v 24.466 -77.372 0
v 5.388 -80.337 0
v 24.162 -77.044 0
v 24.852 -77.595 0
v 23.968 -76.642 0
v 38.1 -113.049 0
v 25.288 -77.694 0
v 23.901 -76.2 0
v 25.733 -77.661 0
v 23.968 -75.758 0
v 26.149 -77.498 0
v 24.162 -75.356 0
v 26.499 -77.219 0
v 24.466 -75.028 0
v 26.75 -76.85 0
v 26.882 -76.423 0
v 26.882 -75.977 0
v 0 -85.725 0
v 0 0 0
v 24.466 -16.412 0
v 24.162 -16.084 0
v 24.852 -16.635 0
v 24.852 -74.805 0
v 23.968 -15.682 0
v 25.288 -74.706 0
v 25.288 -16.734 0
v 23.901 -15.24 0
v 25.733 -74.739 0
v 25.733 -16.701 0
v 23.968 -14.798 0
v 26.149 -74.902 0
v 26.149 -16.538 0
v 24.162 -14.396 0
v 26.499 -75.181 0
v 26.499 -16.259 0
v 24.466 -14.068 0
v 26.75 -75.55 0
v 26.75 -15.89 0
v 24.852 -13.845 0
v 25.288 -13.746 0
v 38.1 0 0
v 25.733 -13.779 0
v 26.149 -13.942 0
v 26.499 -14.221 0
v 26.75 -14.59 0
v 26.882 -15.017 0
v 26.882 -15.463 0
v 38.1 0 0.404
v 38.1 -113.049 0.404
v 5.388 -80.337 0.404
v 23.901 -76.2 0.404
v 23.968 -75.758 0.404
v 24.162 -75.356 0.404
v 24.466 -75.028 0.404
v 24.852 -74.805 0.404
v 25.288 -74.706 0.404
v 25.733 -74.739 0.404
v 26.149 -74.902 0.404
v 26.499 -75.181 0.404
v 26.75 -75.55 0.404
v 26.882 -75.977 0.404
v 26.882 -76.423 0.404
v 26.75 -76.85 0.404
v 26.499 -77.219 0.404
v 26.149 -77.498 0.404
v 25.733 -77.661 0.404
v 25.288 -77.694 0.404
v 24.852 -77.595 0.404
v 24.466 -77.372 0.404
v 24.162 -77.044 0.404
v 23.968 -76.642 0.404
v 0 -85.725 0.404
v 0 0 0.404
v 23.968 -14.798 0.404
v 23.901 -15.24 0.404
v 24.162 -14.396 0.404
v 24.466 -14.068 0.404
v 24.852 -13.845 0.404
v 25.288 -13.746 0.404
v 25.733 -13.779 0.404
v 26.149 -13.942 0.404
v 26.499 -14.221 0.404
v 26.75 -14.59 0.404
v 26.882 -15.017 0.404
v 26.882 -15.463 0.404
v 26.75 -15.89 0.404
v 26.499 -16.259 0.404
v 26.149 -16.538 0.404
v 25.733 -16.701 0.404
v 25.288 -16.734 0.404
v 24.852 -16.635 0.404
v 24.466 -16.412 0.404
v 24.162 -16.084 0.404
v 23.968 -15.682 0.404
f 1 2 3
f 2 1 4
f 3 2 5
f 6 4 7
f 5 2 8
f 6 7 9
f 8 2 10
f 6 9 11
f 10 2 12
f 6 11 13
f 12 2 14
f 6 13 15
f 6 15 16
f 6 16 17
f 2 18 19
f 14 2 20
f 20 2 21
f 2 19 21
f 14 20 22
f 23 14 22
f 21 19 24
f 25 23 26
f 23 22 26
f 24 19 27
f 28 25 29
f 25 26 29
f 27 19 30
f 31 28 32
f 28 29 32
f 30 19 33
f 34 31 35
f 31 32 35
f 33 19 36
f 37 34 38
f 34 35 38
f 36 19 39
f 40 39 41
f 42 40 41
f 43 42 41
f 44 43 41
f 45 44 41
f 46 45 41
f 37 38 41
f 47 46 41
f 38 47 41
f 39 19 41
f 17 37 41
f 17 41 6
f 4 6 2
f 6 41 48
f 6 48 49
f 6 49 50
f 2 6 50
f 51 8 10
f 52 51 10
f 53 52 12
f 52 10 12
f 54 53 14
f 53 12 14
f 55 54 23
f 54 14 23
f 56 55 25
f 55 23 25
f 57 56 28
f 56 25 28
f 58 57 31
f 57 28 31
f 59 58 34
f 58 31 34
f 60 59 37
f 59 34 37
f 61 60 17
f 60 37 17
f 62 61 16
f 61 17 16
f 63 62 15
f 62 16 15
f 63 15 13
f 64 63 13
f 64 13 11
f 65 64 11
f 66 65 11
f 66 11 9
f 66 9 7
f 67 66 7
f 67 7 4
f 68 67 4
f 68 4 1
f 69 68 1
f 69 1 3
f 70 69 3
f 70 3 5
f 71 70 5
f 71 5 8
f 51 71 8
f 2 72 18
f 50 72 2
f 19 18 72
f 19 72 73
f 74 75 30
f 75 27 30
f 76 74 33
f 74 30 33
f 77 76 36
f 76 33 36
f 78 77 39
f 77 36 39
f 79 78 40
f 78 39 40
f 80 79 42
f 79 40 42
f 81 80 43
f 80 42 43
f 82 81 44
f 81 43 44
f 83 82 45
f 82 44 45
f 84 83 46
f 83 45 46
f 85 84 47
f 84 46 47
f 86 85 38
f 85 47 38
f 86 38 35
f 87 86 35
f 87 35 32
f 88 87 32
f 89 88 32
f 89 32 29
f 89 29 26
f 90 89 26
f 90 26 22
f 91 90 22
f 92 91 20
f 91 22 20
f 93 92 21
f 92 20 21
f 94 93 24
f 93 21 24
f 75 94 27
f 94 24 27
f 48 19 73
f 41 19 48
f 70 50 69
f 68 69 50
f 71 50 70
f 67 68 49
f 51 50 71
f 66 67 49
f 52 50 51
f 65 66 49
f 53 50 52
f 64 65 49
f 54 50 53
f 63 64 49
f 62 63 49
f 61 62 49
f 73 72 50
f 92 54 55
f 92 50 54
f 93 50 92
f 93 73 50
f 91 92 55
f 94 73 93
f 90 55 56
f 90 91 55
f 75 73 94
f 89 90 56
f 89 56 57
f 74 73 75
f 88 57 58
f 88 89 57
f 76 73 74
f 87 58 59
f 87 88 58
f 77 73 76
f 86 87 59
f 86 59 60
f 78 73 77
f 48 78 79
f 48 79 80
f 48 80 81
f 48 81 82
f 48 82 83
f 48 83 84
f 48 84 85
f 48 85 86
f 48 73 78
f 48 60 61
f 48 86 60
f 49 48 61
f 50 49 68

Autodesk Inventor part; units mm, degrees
ref_plane "YZ Plane" through (0, 0, 0) normal (1, 0, 0) x (0, 1, 0)
ref_plane "XZ Plane" through (0, 0, 0) normal (0, 1, 0) x (-1, 0, 0)
ref_plane "XY Plane" through (0, 0, 0) normal (0, 0, 1) x (1, 0, 0)
sketch "Sketch1" plane through (0, 0, 0) normal (0, 0, 1) x (1, 0, 0)
  line L0 (0, 0) -> (38.1, 0)
  line L1 (38.1, 0) -> (38.1, -85.725)
  line L2 (38.1, -85.725) -> (0, -85.725)
  line L3 (0, -85.725) -> (0, 0)
  line L4 (38.1, -85.725) -> (38.1, -123.825)
  line L5 (38.1, -123.825) -> (0, -85.725)
  dimension "d0" = 38.1
  dimension "d1" = 85.725
  dimension "d4" = 38.1
extrude "Extrusion1" add sketch "Sketch1" along normal blind 0.4039 contours L0 L1 L2 L3
extrude "Extrusion2" add sketch "Sketch1" along normal blind 0.4039 contours L2 L4 L5
sketch "Sketch2" plane through (0, 0, 0.4039) normal (0, 0, 1) x (1, 0, 0)
  line L0 (0, -85.725) -> (38.1, -123.825) projected
  line L1 (38.1, -123.825) -> (38.1, 0) projected
  line L2 (38.1, -113.0487) -> (5.3882, -80.3368)
  line L3 (0, -85.725) -> (5.3882, -80.3368)
  line L4 (38.1, -113.0487) -> (38.1, -123.825)
  line L5 (38.1, -123.825) -> (0, -85.725)
  line L6 (0, -85.725) -> (5.3882, -80.3368)
  line L7 (5.3882, -80.3368) -> (38.1, -113.0487)
  line L8 (38.1, -113.0487) -> (38.1, -123.825)
  line L9 (38.1, -123.825) -> (0, -85.725)
  dimension "d7" = 7.62
extrude "Extrusion3" cut sketch "Sketch2" against normal blind 25.4
sketch "Sketch3" plane through (0, 0, 0) normal (0, 0, -1) x (-1, 0, 0)
  circle A0 centre (-25.4, -15.24) radius 1.4986
  circle A1 centre (-25.4, -76.2) radius 1.4986
  line L0 (0, 0) -> (-38.1, 0) projected
  line L1 (-38.1, 0) -> (-38.1, -113.0487) projected
  dimension "d19" = 2.9972
  dimension "d20" = 15.24
  dimension "d21" = 12.7
  dimension "d22" = 12.7
extrude "Extrusion4" cut sketch "Sketch3" against normal blind 25.4
properties part number "Plate_InnerSide_Alu25" material "Aluminum 6061"
